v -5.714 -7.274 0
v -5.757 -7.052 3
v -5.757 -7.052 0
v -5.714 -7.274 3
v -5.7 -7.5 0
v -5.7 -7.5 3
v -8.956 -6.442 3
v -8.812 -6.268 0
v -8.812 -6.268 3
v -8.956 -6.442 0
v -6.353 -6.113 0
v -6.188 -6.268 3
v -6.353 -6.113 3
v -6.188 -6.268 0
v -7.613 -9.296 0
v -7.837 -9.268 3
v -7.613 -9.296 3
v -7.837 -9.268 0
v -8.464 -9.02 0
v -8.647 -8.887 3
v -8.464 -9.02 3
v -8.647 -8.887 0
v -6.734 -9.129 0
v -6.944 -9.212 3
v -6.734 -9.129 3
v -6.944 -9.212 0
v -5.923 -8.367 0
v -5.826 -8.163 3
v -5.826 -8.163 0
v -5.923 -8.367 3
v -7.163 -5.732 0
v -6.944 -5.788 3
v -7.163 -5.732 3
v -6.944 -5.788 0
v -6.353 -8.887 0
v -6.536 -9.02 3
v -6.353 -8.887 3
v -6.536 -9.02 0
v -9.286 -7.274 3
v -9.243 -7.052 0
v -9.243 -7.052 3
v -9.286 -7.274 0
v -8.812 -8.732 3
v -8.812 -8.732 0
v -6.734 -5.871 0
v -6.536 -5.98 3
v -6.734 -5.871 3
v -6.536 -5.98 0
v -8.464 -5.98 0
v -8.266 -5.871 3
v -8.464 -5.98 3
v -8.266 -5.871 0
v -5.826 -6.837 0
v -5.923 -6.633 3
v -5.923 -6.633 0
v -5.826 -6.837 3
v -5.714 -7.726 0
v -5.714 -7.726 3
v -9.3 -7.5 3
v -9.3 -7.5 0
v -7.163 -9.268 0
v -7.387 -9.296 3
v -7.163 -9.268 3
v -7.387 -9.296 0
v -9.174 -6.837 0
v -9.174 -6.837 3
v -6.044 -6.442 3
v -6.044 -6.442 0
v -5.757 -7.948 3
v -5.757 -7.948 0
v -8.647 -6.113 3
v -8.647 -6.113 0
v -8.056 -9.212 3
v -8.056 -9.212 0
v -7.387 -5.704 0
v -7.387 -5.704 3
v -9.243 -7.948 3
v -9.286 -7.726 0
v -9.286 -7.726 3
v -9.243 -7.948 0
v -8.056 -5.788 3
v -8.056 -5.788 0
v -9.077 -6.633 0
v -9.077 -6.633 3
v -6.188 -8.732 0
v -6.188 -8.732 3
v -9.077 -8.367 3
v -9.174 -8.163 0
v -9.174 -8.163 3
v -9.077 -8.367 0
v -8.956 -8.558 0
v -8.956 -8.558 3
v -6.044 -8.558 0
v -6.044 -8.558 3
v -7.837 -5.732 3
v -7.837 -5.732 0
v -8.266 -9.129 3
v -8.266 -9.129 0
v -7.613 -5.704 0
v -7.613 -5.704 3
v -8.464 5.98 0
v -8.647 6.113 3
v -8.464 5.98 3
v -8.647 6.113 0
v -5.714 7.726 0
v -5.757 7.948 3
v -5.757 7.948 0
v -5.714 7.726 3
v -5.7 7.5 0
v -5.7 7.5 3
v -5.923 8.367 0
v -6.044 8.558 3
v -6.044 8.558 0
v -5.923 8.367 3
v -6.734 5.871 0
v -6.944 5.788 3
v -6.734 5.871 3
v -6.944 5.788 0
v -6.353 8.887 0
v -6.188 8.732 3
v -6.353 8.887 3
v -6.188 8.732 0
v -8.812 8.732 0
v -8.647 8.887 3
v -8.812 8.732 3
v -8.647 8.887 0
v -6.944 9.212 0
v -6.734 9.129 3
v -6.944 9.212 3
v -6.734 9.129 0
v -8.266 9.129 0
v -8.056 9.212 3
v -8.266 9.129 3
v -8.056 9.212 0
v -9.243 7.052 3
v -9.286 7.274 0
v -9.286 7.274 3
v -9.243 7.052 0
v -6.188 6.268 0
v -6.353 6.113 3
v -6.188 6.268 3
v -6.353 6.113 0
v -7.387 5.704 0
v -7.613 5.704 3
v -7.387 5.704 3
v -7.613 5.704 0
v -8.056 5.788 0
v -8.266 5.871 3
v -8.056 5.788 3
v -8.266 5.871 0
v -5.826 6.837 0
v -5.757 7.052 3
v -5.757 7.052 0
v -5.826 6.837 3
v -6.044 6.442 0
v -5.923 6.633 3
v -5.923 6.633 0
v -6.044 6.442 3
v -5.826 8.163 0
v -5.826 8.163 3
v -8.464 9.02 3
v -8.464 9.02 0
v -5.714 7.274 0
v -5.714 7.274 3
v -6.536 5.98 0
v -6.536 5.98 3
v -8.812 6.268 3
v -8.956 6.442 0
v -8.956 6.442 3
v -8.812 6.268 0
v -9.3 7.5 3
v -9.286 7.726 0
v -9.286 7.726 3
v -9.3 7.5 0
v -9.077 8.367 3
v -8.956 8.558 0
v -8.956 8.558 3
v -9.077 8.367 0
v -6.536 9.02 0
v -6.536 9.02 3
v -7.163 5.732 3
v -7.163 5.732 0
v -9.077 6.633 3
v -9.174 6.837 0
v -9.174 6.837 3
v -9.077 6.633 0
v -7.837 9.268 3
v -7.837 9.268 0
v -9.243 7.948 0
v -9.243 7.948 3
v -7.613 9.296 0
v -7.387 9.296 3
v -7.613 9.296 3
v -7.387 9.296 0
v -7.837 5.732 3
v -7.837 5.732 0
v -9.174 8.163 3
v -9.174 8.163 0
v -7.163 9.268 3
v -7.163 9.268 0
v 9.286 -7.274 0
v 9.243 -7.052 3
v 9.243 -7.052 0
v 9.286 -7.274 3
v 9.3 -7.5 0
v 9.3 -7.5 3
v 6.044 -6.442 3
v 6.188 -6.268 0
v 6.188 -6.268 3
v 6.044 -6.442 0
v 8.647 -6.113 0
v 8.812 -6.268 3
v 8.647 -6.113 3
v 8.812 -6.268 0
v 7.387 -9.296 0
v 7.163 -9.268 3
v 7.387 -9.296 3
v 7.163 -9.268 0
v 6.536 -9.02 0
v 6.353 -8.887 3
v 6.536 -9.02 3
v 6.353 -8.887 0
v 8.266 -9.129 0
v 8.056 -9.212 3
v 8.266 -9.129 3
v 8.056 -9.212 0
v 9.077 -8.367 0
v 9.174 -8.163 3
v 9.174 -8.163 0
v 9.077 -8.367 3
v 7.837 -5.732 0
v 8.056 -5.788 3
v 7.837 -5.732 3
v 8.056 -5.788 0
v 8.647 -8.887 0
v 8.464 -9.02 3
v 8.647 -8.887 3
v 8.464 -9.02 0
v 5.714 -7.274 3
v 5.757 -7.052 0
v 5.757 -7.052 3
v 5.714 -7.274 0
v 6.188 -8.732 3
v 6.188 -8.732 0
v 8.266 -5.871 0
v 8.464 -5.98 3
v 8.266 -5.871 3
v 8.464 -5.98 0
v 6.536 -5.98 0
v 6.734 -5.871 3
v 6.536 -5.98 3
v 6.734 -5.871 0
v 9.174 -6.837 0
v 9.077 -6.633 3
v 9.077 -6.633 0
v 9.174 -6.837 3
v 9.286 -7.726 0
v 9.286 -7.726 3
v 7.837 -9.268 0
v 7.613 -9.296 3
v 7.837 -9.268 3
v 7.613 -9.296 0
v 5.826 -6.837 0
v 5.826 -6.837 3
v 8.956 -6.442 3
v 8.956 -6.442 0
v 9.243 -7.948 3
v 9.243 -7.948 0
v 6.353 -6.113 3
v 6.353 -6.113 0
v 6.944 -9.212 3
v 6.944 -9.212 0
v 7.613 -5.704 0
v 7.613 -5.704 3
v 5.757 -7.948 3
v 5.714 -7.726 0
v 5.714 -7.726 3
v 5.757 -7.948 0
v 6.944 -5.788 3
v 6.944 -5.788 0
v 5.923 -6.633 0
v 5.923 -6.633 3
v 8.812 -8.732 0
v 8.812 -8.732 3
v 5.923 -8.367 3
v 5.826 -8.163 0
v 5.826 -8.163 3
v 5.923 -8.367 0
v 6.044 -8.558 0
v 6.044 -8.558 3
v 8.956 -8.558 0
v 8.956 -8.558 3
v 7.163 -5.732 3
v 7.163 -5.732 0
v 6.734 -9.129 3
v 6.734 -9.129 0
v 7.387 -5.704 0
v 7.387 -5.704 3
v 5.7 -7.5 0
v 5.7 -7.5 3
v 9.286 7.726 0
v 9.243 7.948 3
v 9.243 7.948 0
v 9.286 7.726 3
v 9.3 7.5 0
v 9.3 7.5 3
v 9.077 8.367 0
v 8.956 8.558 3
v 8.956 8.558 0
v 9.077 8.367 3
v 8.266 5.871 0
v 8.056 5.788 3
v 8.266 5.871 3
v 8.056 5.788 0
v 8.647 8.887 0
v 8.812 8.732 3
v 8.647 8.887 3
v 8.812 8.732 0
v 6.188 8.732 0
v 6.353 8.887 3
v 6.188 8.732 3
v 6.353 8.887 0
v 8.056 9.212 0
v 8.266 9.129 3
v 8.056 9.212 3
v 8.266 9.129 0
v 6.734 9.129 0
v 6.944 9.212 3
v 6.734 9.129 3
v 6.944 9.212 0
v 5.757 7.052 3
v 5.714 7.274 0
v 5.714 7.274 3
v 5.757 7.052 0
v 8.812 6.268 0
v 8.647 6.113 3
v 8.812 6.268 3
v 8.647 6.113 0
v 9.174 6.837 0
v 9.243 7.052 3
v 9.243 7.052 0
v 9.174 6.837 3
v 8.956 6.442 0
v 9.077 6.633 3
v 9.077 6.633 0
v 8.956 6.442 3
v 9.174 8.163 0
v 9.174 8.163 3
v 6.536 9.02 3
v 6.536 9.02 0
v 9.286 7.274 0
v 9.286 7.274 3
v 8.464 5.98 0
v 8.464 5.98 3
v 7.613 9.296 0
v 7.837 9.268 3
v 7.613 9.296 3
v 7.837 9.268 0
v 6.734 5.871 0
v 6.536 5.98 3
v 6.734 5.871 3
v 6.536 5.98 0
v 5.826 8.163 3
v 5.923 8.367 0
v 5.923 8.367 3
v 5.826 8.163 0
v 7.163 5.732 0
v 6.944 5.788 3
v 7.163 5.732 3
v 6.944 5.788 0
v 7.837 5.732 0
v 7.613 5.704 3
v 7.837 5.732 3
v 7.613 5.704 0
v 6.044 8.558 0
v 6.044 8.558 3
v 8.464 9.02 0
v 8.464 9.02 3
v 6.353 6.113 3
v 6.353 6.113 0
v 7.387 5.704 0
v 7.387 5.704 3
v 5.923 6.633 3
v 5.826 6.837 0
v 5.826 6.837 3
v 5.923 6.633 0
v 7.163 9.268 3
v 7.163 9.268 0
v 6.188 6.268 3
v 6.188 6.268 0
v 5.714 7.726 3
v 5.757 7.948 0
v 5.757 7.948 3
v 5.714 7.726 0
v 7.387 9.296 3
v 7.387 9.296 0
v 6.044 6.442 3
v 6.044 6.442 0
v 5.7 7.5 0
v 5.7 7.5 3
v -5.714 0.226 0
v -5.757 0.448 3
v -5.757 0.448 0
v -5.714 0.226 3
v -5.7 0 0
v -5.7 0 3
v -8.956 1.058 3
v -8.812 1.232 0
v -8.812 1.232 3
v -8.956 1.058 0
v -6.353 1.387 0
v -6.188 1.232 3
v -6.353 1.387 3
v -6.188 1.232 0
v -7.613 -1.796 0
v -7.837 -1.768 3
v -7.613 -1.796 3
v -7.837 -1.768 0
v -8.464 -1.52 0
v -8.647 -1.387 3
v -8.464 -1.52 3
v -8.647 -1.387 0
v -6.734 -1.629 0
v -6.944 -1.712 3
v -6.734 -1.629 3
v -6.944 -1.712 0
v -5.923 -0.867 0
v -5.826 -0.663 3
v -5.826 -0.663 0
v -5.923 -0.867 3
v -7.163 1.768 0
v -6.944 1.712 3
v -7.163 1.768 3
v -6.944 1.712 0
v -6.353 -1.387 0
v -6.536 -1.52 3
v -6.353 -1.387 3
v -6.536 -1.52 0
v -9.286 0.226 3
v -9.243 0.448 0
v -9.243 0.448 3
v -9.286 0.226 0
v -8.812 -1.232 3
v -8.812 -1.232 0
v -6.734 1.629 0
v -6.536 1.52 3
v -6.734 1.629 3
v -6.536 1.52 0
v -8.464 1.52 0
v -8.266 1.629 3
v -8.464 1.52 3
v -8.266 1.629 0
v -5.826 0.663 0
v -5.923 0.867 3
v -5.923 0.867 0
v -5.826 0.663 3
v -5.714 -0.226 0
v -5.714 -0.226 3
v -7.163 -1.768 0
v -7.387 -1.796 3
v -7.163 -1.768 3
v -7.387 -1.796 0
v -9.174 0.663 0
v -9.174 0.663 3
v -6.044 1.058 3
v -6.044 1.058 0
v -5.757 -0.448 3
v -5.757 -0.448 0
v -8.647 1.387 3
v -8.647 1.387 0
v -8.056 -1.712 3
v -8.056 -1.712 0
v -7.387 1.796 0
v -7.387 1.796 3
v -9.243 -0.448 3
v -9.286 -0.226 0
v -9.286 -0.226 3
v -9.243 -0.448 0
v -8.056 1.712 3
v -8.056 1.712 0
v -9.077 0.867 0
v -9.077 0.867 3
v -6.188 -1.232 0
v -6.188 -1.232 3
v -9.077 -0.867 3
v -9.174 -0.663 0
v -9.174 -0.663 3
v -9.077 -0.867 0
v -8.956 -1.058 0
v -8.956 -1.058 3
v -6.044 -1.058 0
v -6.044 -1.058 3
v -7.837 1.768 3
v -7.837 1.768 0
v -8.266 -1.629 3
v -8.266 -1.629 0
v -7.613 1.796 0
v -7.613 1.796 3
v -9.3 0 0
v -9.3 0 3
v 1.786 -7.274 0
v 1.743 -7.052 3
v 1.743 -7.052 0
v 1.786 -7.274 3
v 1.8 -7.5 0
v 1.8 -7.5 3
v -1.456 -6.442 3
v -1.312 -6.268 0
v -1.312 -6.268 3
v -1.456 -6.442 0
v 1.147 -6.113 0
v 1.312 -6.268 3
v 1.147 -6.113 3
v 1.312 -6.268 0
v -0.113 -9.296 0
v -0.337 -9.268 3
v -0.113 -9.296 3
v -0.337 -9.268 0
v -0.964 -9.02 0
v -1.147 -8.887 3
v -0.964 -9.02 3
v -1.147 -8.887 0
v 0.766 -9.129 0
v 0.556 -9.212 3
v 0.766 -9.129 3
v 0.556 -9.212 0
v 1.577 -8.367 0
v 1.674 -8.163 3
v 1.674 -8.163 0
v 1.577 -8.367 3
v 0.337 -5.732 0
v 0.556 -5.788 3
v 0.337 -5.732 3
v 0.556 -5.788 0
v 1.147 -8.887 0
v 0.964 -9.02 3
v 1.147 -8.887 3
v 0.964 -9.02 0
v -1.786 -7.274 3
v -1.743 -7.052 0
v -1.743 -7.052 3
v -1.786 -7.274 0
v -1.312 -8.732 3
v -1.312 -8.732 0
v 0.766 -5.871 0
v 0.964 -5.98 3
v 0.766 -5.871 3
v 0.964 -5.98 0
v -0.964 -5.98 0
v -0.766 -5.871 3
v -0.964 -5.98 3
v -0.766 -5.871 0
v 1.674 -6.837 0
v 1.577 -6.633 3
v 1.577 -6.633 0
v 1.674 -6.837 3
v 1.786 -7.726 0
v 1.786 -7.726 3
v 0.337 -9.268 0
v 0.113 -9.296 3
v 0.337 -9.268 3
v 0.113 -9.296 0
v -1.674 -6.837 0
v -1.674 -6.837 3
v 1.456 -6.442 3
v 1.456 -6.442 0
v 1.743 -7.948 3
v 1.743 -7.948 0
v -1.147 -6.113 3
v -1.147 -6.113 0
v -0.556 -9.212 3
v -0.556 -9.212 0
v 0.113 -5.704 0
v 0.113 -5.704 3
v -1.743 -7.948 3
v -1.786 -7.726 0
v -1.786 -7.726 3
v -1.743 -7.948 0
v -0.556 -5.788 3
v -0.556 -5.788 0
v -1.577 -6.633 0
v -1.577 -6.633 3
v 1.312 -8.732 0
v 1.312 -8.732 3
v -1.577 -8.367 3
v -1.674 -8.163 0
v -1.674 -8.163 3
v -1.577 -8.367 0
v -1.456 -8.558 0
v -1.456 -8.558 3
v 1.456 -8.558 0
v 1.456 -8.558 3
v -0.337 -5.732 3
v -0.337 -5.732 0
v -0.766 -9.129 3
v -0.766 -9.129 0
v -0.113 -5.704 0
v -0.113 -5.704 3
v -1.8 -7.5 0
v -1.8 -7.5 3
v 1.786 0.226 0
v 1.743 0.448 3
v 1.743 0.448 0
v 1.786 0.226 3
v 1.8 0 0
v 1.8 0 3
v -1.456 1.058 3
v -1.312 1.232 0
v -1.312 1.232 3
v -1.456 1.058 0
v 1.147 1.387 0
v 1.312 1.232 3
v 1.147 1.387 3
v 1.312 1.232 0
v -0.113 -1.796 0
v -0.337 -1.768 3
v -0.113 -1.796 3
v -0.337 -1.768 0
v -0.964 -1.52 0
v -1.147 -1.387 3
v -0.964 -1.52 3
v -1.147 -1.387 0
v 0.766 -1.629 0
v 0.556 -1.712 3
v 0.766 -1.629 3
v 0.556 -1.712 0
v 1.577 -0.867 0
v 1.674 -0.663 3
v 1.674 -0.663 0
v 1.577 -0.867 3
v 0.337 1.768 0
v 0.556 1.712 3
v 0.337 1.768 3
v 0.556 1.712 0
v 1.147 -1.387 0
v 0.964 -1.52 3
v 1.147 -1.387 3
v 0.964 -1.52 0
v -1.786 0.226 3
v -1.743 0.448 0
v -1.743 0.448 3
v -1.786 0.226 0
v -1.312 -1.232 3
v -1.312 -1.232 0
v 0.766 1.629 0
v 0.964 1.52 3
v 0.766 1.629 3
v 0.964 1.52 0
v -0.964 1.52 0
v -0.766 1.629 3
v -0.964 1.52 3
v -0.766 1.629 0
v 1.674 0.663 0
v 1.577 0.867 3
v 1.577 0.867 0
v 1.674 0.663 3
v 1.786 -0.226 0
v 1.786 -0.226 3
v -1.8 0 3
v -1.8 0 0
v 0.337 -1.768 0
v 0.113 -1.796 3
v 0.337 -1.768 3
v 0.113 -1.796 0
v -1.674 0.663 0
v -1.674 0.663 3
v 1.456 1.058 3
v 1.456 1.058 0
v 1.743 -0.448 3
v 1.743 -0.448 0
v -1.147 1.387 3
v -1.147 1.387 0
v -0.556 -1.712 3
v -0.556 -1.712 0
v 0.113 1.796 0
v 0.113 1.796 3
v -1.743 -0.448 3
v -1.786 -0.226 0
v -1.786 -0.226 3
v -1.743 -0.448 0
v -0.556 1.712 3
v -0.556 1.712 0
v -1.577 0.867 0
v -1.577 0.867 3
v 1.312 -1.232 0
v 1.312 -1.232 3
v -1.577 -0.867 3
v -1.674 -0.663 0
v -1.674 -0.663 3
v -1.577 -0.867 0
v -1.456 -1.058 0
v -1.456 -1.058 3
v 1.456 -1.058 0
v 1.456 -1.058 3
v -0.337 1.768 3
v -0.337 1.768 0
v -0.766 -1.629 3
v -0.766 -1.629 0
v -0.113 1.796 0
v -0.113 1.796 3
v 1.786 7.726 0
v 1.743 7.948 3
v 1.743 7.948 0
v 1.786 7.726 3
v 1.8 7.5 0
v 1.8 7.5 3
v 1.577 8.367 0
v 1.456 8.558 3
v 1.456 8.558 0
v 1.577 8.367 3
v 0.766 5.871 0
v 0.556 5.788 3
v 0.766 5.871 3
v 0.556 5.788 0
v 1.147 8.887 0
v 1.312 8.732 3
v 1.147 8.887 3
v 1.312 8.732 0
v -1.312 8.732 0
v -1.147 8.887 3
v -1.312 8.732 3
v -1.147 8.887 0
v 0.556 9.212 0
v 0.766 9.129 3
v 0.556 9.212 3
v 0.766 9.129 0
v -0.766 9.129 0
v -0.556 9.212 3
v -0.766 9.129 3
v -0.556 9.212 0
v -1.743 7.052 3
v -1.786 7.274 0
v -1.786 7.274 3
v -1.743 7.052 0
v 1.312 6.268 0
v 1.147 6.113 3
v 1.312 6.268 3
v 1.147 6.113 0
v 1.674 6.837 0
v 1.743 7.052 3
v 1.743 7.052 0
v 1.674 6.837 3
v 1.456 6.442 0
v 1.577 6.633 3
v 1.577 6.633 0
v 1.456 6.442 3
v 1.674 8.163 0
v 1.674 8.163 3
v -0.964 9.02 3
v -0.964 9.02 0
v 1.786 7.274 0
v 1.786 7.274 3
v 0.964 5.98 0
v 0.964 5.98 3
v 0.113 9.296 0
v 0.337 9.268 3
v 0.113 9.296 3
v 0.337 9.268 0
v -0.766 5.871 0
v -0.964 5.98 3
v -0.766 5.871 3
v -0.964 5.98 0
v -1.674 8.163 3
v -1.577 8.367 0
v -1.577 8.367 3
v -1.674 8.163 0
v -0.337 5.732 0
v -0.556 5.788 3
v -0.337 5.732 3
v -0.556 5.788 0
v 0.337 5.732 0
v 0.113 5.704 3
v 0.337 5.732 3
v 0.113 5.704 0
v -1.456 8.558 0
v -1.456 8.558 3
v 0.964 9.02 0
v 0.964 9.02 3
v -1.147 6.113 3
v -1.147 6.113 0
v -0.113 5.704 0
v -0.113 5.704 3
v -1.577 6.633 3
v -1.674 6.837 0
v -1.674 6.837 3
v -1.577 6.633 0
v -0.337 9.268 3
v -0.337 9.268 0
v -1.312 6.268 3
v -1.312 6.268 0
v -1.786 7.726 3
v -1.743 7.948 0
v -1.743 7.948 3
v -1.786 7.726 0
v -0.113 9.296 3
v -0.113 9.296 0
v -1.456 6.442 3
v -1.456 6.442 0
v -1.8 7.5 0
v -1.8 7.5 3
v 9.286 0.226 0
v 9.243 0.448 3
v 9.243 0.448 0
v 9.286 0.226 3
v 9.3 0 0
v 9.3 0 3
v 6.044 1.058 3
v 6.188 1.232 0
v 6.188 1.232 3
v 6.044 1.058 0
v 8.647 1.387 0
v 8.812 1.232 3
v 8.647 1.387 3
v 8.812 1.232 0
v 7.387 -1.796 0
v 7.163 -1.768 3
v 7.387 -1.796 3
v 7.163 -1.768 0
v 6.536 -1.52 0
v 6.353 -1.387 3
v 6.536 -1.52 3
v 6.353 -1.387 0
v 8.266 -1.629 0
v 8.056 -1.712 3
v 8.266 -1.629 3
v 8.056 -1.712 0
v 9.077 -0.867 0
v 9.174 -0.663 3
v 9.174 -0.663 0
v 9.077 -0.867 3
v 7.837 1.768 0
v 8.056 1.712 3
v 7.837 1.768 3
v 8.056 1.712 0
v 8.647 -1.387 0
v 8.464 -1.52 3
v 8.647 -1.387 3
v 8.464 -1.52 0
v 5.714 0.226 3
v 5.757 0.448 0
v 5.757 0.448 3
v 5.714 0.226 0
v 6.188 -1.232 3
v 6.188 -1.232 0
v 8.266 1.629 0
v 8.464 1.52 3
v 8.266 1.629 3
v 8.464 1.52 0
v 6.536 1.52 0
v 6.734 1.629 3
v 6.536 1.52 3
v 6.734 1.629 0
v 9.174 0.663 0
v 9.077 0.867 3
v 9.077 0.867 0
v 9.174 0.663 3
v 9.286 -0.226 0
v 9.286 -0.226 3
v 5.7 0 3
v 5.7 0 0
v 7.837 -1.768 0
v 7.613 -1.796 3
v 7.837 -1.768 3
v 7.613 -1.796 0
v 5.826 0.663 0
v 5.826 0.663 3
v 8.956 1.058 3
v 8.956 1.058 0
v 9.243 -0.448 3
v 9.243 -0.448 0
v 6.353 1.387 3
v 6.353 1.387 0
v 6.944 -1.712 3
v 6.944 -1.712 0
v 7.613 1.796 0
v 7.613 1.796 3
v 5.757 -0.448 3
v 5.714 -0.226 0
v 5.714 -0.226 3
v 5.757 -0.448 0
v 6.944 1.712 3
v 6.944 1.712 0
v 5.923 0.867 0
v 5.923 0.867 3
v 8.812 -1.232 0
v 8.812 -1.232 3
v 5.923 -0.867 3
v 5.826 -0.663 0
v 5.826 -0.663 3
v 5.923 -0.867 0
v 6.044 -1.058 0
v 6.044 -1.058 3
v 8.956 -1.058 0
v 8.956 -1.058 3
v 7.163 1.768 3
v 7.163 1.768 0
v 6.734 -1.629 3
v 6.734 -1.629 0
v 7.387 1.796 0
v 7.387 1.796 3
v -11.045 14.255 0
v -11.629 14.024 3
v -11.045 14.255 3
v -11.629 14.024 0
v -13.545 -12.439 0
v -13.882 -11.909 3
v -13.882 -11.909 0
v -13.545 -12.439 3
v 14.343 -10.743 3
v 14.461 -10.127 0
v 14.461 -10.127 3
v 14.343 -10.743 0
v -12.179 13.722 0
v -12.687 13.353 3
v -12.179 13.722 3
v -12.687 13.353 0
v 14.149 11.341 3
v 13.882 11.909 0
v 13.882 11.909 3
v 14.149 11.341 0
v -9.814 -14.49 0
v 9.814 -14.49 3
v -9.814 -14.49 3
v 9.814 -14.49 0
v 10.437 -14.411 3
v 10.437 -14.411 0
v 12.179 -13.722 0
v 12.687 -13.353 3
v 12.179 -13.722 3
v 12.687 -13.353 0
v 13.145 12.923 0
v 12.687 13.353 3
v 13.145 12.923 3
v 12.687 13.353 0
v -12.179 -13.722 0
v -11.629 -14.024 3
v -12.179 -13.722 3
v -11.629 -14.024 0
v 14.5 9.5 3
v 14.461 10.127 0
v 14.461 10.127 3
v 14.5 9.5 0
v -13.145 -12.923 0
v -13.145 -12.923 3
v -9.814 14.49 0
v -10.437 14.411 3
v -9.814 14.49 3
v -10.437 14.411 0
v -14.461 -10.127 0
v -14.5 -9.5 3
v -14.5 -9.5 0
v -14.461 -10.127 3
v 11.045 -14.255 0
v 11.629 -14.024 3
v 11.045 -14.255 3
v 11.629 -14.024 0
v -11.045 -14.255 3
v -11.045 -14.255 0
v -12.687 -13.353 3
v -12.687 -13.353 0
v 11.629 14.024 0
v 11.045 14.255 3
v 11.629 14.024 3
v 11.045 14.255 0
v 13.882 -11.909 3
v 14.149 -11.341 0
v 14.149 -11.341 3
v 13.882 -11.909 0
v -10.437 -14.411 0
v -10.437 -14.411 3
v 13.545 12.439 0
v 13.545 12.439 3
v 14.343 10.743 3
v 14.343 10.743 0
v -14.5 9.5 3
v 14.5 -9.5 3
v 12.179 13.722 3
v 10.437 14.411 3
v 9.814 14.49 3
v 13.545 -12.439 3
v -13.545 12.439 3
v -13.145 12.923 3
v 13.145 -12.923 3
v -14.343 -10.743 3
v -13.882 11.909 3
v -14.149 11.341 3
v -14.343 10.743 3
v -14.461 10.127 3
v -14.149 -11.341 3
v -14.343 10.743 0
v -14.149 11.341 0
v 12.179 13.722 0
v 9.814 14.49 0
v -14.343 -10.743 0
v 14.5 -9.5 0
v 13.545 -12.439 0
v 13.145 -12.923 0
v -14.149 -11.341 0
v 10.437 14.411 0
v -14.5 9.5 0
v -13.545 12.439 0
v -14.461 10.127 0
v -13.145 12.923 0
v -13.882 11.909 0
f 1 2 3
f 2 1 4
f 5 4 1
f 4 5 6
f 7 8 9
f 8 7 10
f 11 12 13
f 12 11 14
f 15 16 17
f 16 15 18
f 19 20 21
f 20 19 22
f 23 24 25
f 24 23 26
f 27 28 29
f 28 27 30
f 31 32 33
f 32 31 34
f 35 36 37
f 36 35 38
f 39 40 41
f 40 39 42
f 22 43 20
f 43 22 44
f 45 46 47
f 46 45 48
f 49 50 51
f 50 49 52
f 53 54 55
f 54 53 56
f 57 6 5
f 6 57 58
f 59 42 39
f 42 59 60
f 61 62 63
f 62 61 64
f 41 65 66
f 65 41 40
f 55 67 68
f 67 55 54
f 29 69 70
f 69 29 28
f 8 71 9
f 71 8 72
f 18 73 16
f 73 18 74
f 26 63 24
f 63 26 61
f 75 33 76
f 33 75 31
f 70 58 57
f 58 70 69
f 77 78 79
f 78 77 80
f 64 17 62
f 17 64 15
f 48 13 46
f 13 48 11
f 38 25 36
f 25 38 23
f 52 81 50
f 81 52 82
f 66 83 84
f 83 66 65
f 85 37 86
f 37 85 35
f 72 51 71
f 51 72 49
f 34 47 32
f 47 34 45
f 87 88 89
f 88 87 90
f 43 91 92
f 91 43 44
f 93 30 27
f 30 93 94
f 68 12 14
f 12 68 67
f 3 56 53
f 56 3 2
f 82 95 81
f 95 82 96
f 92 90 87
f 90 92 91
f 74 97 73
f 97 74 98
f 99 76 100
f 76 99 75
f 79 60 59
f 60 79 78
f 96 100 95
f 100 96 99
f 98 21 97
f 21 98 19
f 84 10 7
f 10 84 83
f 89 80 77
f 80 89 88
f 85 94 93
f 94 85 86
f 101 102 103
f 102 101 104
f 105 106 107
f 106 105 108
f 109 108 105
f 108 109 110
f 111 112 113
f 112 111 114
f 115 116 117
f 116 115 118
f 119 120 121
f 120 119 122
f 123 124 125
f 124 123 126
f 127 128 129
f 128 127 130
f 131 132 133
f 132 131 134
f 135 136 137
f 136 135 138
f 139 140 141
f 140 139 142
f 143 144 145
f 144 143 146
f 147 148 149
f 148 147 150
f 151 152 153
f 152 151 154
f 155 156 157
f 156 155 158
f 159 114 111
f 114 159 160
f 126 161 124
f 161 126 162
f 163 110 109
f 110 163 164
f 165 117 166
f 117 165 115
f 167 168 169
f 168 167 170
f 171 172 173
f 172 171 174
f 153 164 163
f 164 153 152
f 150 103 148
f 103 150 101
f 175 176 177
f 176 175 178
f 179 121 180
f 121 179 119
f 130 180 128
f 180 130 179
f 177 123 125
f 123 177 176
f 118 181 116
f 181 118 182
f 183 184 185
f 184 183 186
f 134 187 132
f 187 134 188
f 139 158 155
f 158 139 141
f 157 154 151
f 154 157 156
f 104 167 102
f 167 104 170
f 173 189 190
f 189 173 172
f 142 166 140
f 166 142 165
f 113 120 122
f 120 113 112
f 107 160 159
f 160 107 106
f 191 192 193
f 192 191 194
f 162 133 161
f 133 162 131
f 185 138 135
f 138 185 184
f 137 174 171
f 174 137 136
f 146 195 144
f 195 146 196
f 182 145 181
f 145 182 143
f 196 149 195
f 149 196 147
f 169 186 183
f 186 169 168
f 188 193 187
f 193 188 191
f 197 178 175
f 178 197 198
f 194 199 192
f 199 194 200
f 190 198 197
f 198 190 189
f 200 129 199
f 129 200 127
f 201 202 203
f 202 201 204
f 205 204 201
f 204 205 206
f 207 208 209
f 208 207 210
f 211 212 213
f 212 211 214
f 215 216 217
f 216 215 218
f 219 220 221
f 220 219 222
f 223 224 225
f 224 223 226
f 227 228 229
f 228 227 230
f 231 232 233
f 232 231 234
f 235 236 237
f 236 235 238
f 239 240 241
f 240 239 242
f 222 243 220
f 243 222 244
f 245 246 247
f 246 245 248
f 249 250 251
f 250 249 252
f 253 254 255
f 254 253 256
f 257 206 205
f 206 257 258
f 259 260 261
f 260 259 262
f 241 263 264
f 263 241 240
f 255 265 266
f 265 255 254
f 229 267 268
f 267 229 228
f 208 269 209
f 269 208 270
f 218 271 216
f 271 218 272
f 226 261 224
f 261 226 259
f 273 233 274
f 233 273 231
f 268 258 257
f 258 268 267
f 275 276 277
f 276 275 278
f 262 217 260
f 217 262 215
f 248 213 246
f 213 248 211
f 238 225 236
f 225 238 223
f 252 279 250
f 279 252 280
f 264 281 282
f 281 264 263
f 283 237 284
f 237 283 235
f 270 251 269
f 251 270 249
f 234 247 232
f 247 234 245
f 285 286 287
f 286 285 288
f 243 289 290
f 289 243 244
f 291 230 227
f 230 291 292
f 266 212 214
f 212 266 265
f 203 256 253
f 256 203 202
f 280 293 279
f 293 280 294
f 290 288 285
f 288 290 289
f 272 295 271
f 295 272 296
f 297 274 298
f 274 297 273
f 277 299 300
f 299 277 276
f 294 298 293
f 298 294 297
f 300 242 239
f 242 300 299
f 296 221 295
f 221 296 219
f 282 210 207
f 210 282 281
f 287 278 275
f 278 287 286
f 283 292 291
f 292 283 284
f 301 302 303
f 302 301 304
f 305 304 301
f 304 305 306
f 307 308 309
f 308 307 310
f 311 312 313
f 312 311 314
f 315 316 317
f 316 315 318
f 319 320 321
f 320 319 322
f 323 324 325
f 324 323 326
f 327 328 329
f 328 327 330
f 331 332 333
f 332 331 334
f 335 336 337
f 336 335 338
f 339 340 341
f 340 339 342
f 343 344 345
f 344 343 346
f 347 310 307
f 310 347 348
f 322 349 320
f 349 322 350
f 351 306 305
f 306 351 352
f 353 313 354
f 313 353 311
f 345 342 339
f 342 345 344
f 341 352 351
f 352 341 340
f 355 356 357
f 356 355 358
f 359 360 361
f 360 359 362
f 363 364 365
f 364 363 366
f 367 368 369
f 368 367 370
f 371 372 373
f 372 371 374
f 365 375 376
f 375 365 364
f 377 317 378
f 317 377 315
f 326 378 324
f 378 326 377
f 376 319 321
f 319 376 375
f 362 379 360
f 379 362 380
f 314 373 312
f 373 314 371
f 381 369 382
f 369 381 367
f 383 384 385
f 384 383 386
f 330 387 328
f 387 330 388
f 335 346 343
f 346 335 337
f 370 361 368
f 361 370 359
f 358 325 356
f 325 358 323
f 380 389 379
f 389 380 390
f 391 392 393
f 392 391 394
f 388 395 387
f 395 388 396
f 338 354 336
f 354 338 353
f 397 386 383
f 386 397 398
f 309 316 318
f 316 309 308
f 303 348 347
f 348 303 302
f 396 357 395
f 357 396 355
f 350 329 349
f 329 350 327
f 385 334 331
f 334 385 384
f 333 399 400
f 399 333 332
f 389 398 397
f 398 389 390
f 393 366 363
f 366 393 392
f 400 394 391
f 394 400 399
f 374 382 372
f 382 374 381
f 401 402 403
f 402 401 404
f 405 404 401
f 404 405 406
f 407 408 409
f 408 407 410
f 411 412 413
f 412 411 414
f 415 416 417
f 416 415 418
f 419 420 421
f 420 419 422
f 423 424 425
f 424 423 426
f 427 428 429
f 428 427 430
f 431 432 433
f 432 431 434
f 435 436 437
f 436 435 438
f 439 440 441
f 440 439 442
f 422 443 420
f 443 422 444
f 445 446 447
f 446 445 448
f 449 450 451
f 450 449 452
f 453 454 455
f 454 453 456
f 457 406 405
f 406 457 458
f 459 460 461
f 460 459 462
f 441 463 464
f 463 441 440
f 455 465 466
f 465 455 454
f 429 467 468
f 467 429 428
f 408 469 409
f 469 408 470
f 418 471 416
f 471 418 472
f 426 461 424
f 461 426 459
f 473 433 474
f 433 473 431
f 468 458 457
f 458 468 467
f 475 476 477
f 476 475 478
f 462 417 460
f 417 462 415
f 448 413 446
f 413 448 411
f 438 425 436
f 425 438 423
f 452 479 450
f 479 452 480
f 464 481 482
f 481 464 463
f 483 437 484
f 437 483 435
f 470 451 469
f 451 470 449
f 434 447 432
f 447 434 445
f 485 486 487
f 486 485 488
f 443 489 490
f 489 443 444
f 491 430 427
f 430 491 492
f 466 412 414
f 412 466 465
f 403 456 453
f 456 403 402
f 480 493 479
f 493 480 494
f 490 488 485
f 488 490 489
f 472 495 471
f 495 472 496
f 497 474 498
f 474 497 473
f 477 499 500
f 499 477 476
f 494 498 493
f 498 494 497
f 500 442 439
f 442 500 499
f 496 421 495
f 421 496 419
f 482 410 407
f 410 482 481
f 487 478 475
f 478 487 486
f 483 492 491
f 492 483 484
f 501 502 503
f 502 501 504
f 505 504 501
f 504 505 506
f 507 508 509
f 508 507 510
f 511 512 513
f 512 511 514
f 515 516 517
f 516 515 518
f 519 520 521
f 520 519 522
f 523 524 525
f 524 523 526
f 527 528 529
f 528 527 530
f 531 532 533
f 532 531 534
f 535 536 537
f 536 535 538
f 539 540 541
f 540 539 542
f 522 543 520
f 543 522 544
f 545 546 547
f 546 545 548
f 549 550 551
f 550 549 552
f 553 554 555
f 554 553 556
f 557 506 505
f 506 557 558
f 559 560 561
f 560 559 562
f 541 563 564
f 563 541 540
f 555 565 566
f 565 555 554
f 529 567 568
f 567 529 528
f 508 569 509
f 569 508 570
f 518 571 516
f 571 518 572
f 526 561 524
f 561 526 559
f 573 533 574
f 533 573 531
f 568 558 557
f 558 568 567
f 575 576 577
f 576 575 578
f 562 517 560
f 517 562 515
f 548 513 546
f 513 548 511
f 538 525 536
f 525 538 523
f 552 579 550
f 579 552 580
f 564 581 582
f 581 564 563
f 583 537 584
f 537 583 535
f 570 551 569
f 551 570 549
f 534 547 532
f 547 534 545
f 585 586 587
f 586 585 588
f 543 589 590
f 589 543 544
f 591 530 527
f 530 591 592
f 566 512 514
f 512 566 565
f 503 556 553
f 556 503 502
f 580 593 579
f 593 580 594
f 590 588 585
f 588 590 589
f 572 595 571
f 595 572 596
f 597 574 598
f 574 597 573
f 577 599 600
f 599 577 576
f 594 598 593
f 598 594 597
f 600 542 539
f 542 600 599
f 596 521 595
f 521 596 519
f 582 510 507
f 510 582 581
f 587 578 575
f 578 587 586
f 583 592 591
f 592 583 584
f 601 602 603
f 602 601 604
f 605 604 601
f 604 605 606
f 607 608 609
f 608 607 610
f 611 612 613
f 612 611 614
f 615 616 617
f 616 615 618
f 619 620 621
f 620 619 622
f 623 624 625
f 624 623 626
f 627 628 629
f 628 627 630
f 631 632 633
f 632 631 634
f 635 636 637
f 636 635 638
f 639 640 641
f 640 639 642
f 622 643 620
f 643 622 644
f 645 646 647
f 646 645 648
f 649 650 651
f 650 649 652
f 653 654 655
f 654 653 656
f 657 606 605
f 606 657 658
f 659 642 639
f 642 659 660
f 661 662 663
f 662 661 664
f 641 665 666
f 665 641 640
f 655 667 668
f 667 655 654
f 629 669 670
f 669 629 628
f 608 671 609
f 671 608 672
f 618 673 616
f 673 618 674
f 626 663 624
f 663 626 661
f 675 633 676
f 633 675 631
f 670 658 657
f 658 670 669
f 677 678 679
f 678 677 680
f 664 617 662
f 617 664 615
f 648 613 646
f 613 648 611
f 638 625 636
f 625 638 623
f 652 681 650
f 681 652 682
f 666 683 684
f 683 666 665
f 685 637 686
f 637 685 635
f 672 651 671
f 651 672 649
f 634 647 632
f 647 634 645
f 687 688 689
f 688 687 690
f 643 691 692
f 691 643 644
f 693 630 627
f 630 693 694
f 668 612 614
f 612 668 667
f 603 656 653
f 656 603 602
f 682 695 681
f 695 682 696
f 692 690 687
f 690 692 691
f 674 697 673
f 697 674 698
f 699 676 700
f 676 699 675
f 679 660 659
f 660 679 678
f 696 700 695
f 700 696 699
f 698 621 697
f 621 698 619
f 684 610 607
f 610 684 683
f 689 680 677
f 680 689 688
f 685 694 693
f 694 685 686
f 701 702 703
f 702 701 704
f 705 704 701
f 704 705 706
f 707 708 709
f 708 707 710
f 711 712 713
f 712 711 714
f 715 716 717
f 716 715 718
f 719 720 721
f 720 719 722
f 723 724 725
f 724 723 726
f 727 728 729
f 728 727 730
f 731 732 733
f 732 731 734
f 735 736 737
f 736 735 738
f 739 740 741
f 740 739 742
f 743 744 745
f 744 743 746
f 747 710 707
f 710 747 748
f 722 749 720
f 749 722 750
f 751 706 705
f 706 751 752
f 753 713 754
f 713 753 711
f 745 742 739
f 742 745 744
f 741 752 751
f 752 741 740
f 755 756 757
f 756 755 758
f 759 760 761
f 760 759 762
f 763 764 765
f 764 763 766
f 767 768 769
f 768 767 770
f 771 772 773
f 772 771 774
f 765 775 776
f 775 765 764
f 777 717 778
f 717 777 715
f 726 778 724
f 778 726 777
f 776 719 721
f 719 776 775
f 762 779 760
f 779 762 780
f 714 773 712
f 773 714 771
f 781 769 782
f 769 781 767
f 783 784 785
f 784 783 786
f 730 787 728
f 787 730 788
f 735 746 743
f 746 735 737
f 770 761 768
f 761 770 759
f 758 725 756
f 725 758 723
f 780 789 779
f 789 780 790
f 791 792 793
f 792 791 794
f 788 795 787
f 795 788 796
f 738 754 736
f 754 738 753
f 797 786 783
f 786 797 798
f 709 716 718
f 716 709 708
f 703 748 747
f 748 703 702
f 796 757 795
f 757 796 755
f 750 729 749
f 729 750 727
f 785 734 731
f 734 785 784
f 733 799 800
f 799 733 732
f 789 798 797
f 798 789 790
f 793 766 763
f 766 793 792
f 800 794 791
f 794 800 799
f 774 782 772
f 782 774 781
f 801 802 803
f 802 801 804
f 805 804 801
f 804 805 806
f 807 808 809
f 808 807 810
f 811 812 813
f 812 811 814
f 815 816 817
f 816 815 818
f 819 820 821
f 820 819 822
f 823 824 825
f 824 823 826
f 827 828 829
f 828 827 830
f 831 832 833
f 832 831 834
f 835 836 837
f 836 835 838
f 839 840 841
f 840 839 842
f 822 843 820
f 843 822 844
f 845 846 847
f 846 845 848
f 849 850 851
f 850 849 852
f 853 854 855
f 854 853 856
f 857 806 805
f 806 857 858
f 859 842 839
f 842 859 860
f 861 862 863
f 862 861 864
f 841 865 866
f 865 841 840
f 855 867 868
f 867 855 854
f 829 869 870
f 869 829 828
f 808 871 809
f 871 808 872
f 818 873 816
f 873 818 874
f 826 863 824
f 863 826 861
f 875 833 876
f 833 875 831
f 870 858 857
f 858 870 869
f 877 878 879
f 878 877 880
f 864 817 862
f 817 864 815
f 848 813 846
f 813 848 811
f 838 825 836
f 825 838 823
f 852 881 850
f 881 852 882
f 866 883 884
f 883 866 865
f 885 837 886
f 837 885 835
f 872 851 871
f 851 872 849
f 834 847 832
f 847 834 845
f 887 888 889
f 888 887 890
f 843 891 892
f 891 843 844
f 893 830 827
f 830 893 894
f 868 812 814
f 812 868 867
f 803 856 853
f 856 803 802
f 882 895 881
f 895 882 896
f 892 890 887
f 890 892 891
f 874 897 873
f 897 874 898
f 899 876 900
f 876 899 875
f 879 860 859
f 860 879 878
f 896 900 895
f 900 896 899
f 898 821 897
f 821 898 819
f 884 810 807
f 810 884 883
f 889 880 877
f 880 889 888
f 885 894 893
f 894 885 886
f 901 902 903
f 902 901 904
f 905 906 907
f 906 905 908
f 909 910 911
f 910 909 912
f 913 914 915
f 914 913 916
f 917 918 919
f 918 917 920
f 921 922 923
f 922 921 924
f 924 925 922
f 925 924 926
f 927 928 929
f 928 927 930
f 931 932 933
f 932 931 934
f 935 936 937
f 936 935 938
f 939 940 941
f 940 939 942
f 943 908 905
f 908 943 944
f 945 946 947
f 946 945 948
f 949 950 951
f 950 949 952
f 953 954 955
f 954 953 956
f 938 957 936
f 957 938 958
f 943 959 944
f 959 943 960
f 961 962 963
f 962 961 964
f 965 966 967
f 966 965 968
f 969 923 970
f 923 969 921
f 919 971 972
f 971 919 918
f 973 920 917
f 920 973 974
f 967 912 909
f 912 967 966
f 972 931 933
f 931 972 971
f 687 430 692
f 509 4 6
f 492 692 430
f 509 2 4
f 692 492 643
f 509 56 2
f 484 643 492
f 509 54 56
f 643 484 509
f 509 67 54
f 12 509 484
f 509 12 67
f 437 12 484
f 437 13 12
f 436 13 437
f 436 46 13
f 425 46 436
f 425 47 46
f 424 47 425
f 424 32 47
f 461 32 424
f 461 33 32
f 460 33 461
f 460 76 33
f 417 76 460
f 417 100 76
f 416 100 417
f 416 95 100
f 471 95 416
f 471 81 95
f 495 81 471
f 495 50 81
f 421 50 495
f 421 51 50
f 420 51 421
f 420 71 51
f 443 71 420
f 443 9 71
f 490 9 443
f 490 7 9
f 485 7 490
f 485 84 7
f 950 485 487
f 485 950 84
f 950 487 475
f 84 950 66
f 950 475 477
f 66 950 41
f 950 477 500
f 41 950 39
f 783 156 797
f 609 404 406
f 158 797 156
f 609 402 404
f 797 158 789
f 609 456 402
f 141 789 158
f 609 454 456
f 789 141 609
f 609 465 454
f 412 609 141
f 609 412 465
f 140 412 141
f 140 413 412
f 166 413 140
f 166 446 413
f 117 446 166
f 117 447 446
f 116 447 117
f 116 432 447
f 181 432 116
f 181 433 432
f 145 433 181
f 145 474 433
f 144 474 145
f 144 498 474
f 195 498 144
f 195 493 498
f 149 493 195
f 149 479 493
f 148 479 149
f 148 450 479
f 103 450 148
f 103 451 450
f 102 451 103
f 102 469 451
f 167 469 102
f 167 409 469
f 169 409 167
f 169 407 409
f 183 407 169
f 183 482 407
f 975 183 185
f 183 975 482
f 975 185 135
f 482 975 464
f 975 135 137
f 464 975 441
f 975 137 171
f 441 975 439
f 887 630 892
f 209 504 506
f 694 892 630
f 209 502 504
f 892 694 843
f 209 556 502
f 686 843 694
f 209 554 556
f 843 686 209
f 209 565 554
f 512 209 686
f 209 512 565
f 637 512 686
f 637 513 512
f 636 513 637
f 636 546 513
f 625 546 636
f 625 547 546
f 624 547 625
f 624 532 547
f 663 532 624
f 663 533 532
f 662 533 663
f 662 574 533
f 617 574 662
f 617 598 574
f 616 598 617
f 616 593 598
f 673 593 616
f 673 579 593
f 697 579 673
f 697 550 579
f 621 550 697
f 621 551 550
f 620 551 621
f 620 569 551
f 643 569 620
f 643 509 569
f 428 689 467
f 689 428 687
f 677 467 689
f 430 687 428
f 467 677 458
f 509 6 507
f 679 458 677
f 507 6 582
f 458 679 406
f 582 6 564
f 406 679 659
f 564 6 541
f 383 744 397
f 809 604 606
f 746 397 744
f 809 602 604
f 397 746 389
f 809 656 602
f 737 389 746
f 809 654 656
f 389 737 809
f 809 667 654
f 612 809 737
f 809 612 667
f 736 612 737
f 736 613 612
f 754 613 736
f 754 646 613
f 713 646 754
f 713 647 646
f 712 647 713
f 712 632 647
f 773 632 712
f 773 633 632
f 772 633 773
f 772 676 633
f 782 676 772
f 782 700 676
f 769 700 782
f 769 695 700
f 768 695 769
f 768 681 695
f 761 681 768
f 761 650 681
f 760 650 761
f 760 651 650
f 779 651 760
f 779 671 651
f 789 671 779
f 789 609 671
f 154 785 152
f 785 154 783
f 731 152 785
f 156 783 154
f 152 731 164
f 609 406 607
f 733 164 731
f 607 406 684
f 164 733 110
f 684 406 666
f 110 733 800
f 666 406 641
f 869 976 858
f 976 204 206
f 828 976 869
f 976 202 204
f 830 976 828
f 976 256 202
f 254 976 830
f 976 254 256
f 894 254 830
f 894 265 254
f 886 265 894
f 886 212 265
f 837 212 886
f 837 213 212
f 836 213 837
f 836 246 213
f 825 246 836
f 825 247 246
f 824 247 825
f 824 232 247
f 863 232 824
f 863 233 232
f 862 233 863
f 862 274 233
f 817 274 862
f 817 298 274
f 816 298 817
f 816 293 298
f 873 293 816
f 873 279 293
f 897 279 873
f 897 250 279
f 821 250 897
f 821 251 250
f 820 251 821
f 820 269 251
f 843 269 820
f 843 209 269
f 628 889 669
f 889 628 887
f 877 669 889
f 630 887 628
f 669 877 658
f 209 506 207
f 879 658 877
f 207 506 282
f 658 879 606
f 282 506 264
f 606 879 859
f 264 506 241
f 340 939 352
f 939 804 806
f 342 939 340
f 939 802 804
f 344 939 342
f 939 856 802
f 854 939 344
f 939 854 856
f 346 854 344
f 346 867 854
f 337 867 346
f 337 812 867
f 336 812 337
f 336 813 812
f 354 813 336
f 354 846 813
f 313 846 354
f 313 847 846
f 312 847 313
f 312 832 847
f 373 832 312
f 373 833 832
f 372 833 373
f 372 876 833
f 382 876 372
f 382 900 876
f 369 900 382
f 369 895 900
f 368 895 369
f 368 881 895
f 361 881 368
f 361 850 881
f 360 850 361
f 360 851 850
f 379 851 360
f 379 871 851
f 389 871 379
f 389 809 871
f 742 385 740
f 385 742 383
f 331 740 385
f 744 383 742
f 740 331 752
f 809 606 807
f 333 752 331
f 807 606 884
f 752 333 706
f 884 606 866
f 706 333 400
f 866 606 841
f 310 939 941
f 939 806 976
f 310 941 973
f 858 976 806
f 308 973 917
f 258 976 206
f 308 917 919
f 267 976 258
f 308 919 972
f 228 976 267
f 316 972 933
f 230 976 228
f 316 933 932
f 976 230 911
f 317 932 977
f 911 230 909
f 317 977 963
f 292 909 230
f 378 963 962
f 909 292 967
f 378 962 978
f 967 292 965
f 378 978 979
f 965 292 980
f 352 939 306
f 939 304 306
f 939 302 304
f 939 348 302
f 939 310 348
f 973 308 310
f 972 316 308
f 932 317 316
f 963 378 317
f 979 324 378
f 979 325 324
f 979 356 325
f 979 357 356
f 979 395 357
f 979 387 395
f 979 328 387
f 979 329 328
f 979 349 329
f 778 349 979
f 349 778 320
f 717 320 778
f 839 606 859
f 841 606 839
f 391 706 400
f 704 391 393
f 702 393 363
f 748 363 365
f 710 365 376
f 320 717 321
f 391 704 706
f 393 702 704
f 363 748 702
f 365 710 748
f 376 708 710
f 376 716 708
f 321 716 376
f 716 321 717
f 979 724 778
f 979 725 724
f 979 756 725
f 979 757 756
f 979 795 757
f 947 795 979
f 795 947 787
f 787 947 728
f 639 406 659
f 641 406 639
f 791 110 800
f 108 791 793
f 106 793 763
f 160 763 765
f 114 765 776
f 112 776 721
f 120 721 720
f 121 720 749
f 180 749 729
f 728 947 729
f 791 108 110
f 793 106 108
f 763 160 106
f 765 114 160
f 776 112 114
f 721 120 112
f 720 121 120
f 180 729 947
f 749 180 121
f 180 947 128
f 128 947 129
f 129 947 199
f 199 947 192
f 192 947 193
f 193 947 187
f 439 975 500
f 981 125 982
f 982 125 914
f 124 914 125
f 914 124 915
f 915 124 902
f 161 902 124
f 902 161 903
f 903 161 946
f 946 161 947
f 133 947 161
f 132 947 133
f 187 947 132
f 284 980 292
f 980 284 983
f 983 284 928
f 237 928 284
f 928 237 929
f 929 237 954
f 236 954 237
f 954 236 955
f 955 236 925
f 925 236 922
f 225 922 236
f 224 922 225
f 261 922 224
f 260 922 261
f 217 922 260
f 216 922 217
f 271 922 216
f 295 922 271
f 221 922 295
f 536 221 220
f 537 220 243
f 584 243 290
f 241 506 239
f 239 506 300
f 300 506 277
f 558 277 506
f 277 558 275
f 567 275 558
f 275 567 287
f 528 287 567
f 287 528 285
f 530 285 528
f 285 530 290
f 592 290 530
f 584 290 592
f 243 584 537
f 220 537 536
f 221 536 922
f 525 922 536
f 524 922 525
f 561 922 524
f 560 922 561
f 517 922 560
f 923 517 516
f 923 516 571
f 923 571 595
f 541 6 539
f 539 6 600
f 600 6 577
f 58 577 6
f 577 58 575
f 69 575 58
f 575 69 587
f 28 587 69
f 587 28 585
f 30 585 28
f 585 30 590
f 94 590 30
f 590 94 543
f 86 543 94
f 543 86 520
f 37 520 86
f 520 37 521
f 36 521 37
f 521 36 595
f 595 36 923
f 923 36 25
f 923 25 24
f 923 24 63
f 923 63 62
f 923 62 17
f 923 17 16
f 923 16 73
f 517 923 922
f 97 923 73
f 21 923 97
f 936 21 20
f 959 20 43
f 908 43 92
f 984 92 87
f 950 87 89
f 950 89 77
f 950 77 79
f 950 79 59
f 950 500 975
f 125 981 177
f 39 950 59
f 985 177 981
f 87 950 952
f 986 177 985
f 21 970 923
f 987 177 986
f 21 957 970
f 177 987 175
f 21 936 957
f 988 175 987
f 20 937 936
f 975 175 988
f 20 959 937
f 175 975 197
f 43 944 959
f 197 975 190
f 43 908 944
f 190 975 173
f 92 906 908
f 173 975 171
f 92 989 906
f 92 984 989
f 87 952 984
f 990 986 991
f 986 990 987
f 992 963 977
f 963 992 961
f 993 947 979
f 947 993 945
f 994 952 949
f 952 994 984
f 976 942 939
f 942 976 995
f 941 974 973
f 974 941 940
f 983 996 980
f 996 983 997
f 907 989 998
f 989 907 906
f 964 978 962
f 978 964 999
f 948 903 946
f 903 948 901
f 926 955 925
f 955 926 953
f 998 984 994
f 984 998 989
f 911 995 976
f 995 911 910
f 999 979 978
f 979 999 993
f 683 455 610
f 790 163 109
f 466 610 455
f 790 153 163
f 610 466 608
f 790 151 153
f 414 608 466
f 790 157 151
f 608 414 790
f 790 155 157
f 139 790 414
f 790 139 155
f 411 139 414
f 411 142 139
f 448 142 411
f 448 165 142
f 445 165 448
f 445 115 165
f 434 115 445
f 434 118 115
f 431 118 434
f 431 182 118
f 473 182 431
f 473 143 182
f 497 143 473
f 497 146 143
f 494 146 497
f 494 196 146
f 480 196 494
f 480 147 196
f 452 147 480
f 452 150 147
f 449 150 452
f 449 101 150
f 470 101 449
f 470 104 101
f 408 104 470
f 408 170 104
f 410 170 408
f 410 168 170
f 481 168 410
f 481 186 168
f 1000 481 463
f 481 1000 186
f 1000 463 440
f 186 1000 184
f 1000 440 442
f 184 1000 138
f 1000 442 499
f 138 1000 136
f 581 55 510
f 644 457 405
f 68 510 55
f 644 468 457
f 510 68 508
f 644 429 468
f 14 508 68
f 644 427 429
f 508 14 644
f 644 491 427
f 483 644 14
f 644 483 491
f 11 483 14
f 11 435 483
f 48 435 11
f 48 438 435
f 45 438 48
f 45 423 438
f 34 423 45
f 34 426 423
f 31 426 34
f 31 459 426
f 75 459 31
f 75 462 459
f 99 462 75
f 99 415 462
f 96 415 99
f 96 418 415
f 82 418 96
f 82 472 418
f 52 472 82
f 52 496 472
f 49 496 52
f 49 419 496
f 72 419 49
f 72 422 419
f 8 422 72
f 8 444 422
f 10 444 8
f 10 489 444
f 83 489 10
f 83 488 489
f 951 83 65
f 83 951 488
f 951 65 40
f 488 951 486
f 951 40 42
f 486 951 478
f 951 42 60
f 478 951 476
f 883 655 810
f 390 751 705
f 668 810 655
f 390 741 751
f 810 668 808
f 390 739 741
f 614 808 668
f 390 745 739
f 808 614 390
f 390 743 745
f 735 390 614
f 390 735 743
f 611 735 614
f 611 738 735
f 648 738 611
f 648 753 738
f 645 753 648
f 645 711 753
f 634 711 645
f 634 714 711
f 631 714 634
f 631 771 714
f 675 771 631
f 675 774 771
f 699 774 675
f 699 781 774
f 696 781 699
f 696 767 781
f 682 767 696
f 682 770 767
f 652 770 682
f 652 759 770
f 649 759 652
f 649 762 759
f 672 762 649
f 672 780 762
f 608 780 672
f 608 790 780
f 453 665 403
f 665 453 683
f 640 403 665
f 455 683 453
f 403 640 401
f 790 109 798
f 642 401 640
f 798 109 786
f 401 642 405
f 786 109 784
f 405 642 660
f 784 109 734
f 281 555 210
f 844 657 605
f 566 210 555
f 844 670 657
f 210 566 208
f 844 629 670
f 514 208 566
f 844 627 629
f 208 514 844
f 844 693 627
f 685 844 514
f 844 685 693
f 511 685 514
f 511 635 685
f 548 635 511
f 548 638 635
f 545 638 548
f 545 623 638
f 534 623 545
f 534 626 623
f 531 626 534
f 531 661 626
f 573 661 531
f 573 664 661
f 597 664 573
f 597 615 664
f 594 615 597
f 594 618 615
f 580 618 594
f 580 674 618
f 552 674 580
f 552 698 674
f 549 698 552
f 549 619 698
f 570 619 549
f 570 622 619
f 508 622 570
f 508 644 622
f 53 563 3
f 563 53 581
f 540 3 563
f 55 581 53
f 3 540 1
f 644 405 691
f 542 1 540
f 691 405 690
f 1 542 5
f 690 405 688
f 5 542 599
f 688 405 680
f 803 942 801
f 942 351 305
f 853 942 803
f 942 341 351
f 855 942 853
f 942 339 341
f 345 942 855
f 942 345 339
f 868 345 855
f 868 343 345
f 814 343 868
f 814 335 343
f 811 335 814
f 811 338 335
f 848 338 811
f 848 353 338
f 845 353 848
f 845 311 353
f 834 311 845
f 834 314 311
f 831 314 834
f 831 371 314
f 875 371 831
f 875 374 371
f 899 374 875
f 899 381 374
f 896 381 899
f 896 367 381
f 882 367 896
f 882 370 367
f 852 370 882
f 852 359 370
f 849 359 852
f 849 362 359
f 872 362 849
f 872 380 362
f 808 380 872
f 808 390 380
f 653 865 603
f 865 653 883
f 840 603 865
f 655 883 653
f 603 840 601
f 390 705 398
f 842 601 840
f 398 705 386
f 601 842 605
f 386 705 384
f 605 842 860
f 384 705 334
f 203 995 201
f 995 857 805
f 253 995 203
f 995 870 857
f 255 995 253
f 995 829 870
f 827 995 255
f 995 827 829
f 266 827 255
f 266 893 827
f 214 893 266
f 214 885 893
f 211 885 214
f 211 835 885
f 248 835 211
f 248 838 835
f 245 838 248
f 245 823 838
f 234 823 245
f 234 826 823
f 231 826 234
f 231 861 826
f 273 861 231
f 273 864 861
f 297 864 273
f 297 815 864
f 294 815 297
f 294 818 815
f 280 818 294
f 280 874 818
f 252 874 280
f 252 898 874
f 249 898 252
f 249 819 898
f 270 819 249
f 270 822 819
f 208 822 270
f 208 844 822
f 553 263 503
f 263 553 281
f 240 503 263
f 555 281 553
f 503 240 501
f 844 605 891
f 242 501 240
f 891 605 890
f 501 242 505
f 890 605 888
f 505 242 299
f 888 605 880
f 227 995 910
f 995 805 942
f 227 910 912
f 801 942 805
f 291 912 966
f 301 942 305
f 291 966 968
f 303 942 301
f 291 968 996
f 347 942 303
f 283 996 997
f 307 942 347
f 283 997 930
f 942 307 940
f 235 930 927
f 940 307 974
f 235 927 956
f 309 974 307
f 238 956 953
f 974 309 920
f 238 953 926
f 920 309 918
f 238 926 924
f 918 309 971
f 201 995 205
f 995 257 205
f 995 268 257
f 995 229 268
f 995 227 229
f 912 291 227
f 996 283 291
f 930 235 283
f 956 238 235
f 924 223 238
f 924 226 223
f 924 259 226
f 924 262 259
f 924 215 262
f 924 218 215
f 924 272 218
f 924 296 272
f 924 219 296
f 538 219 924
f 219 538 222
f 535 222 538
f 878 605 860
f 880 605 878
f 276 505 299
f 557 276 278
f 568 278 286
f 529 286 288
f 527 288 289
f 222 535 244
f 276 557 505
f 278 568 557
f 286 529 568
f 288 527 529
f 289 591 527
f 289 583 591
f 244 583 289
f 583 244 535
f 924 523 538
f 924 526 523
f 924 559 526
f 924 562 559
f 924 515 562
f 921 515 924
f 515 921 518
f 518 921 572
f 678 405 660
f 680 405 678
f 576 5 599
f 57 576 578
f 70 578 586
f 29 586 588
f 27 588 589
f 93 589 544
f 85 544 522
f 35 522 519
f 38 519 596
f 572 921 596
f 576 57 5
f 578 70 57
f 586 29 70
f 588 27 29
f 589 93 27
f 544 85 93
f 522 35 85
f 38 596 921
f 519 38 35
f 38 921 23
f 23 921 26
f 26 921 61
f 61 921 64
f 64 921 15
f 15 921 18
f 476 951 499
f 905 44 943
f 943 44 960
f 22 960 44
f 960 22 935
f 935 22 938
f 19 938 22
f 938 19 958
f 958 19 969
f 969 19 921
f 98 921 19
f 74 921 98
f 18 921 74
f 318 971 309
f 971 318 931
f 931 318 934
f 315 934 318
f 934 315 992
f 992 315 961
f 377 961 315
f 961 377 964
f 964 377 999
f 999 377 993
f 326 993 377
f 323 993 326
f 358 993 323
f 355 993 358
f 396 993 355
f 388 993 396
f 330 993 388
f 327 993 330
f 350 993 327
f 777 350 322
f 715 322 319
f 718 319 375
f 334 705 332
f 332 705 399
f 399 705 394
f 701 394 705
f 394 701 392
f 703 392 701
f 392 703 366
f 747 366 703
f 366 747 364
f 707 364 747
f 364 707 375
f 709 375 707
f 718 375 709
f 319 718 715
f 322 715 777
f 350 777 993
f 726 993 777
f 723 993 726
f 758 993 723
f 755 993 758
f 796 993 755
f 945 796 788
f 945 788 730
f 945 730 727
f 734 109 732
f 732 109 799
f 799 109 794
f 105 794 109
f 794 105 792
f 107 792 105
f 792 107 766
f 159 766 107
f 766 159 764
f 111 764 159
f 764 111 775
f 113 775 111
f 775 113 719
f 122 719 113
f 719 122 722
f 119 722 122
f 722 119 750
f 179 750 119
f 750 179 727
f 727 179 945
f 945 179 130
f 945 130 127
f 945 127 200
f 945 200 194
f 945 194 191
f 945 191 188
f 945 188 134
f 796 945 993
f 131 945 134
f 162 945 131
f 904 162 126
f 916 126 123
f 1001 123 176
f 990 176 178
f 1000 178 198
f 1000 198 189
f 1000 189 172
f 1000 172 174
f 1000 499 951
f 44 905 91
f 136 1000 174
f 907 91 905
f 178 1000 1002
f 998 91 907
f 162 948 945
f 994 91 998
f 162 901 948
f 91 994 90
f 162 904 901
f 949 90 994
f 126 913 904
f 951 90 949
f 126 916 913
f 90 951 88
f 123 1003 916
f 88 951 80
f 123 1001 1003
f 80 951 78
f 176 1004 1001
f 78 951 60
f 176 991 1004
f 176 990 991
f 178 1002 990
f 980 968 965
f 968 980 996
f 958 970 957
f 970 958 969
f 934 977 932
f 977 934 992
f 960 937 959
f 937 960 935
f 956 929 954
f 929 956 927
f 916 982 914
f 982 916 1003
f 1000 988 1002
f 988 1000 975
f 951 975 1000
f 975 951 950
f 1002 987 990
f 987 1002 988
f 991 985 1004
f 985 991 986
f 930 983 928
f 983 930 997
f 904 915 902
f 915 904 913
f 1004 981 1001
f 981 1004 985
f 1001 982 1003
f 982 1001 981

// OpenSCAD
$fn = 50;


difference() {
	union() {
		hull() {
			translate(v = [-9.5000000000, 9.5000000000, 0]) {
				cylinder(h = 3, r = 5);
			}
			translate(v = [9.5000000000, 9.5000000000, 0]) {
				cylinder(h = 3, r = 5);
			}
			translate(v = [-9.5000000000, -9.5000000000, 0]) {
				cylinder(h = 3, r = 5);
			}
			translate(v = [9.5000000000, -9.5000000000, 0]) {
				cylinder(h = 3, r = 5);
			}
		}
	}
	union() {
		translate(v = [-7.5000000000, -7.5000000000, 0]) {
			translate(v = [0, 0, -100]) {
				cylinder(h = 200, r = 1.8000000000);
			}
		}
		translate(v = [-7.5000000000, 7.5000000000, 0]) {
			translate(v = [0, 0, -100]) {
				cylinder(h = 200, r = 1.8000000000);
			}
		}
		translate(v = [7.5000000000, -7.5000000000, 0]) {
			translate(v = [0, 0, -100]) {
				cylinder(h = 200, r = 1.8000000000);
			}
		}
		translate(v = [7.5000000000, 7.5000000000, 0]) {
			translate(v = [0, 0, -100]) {
				cylinder(h = 200, r = 1.8000000000);
			}
		}
		translate(v = [-7.5000000000, -7.5000000000, 0]) {
			translate(v = [0, 0, -100]) {
				cylinder(h = 200, r = 1.8000000000);
			}
		}
		translate(v = [-7.5000000000, 0.0000000000, 0]) {
			translate(v = [0, 0, -100]) {
				cylinder(h = 200, r = 1.8000000000);
			}
		}
		translate(v = [-7.5000000000, 7.5000000000, 0]) {
			translate(v = [0, 0, -100]) {
				cylinder(h = 200, r = 1.8000000000);
			}
		}
		translate(v = [0.0000000000, -7.5000000000, 0]) {
			translate(v = [0, 0, -100]) {
				cylinder(h = 200, r = 1.8000000000);
			}
		}
		translate(v = [0, 0, -100]) {
			cylinder(h = 200, r = 1.8000000000);
		}
		translate(v = [0.0000000000, 7.5000000000, 0]) {
			translate(v = [0, 0, -100]) {
				cylinder(h = 200, r = 1.8000000000);
			}
		}
		translate(v = [7.5000000000, -7.5000000000, 0]) {
			translate(v = [0, 0, -100]) {
				cylinder(h = 200, r = 1.8000000000);
			}
		}
		translate(v = [7.5000000000, 0.0000000000, 0]) {
			translate(v = [0, 0, -100]) {
				cylinder(h = 200, r = 1.8000000000);
			}
		}
		translate(v = [7.5000000000, 7.5000000000, 0]) {
			translate(v = [0, 0, -100]) {
				cylinder(h = 200, r = 1.8000000000);
			}
		}
	}
}
